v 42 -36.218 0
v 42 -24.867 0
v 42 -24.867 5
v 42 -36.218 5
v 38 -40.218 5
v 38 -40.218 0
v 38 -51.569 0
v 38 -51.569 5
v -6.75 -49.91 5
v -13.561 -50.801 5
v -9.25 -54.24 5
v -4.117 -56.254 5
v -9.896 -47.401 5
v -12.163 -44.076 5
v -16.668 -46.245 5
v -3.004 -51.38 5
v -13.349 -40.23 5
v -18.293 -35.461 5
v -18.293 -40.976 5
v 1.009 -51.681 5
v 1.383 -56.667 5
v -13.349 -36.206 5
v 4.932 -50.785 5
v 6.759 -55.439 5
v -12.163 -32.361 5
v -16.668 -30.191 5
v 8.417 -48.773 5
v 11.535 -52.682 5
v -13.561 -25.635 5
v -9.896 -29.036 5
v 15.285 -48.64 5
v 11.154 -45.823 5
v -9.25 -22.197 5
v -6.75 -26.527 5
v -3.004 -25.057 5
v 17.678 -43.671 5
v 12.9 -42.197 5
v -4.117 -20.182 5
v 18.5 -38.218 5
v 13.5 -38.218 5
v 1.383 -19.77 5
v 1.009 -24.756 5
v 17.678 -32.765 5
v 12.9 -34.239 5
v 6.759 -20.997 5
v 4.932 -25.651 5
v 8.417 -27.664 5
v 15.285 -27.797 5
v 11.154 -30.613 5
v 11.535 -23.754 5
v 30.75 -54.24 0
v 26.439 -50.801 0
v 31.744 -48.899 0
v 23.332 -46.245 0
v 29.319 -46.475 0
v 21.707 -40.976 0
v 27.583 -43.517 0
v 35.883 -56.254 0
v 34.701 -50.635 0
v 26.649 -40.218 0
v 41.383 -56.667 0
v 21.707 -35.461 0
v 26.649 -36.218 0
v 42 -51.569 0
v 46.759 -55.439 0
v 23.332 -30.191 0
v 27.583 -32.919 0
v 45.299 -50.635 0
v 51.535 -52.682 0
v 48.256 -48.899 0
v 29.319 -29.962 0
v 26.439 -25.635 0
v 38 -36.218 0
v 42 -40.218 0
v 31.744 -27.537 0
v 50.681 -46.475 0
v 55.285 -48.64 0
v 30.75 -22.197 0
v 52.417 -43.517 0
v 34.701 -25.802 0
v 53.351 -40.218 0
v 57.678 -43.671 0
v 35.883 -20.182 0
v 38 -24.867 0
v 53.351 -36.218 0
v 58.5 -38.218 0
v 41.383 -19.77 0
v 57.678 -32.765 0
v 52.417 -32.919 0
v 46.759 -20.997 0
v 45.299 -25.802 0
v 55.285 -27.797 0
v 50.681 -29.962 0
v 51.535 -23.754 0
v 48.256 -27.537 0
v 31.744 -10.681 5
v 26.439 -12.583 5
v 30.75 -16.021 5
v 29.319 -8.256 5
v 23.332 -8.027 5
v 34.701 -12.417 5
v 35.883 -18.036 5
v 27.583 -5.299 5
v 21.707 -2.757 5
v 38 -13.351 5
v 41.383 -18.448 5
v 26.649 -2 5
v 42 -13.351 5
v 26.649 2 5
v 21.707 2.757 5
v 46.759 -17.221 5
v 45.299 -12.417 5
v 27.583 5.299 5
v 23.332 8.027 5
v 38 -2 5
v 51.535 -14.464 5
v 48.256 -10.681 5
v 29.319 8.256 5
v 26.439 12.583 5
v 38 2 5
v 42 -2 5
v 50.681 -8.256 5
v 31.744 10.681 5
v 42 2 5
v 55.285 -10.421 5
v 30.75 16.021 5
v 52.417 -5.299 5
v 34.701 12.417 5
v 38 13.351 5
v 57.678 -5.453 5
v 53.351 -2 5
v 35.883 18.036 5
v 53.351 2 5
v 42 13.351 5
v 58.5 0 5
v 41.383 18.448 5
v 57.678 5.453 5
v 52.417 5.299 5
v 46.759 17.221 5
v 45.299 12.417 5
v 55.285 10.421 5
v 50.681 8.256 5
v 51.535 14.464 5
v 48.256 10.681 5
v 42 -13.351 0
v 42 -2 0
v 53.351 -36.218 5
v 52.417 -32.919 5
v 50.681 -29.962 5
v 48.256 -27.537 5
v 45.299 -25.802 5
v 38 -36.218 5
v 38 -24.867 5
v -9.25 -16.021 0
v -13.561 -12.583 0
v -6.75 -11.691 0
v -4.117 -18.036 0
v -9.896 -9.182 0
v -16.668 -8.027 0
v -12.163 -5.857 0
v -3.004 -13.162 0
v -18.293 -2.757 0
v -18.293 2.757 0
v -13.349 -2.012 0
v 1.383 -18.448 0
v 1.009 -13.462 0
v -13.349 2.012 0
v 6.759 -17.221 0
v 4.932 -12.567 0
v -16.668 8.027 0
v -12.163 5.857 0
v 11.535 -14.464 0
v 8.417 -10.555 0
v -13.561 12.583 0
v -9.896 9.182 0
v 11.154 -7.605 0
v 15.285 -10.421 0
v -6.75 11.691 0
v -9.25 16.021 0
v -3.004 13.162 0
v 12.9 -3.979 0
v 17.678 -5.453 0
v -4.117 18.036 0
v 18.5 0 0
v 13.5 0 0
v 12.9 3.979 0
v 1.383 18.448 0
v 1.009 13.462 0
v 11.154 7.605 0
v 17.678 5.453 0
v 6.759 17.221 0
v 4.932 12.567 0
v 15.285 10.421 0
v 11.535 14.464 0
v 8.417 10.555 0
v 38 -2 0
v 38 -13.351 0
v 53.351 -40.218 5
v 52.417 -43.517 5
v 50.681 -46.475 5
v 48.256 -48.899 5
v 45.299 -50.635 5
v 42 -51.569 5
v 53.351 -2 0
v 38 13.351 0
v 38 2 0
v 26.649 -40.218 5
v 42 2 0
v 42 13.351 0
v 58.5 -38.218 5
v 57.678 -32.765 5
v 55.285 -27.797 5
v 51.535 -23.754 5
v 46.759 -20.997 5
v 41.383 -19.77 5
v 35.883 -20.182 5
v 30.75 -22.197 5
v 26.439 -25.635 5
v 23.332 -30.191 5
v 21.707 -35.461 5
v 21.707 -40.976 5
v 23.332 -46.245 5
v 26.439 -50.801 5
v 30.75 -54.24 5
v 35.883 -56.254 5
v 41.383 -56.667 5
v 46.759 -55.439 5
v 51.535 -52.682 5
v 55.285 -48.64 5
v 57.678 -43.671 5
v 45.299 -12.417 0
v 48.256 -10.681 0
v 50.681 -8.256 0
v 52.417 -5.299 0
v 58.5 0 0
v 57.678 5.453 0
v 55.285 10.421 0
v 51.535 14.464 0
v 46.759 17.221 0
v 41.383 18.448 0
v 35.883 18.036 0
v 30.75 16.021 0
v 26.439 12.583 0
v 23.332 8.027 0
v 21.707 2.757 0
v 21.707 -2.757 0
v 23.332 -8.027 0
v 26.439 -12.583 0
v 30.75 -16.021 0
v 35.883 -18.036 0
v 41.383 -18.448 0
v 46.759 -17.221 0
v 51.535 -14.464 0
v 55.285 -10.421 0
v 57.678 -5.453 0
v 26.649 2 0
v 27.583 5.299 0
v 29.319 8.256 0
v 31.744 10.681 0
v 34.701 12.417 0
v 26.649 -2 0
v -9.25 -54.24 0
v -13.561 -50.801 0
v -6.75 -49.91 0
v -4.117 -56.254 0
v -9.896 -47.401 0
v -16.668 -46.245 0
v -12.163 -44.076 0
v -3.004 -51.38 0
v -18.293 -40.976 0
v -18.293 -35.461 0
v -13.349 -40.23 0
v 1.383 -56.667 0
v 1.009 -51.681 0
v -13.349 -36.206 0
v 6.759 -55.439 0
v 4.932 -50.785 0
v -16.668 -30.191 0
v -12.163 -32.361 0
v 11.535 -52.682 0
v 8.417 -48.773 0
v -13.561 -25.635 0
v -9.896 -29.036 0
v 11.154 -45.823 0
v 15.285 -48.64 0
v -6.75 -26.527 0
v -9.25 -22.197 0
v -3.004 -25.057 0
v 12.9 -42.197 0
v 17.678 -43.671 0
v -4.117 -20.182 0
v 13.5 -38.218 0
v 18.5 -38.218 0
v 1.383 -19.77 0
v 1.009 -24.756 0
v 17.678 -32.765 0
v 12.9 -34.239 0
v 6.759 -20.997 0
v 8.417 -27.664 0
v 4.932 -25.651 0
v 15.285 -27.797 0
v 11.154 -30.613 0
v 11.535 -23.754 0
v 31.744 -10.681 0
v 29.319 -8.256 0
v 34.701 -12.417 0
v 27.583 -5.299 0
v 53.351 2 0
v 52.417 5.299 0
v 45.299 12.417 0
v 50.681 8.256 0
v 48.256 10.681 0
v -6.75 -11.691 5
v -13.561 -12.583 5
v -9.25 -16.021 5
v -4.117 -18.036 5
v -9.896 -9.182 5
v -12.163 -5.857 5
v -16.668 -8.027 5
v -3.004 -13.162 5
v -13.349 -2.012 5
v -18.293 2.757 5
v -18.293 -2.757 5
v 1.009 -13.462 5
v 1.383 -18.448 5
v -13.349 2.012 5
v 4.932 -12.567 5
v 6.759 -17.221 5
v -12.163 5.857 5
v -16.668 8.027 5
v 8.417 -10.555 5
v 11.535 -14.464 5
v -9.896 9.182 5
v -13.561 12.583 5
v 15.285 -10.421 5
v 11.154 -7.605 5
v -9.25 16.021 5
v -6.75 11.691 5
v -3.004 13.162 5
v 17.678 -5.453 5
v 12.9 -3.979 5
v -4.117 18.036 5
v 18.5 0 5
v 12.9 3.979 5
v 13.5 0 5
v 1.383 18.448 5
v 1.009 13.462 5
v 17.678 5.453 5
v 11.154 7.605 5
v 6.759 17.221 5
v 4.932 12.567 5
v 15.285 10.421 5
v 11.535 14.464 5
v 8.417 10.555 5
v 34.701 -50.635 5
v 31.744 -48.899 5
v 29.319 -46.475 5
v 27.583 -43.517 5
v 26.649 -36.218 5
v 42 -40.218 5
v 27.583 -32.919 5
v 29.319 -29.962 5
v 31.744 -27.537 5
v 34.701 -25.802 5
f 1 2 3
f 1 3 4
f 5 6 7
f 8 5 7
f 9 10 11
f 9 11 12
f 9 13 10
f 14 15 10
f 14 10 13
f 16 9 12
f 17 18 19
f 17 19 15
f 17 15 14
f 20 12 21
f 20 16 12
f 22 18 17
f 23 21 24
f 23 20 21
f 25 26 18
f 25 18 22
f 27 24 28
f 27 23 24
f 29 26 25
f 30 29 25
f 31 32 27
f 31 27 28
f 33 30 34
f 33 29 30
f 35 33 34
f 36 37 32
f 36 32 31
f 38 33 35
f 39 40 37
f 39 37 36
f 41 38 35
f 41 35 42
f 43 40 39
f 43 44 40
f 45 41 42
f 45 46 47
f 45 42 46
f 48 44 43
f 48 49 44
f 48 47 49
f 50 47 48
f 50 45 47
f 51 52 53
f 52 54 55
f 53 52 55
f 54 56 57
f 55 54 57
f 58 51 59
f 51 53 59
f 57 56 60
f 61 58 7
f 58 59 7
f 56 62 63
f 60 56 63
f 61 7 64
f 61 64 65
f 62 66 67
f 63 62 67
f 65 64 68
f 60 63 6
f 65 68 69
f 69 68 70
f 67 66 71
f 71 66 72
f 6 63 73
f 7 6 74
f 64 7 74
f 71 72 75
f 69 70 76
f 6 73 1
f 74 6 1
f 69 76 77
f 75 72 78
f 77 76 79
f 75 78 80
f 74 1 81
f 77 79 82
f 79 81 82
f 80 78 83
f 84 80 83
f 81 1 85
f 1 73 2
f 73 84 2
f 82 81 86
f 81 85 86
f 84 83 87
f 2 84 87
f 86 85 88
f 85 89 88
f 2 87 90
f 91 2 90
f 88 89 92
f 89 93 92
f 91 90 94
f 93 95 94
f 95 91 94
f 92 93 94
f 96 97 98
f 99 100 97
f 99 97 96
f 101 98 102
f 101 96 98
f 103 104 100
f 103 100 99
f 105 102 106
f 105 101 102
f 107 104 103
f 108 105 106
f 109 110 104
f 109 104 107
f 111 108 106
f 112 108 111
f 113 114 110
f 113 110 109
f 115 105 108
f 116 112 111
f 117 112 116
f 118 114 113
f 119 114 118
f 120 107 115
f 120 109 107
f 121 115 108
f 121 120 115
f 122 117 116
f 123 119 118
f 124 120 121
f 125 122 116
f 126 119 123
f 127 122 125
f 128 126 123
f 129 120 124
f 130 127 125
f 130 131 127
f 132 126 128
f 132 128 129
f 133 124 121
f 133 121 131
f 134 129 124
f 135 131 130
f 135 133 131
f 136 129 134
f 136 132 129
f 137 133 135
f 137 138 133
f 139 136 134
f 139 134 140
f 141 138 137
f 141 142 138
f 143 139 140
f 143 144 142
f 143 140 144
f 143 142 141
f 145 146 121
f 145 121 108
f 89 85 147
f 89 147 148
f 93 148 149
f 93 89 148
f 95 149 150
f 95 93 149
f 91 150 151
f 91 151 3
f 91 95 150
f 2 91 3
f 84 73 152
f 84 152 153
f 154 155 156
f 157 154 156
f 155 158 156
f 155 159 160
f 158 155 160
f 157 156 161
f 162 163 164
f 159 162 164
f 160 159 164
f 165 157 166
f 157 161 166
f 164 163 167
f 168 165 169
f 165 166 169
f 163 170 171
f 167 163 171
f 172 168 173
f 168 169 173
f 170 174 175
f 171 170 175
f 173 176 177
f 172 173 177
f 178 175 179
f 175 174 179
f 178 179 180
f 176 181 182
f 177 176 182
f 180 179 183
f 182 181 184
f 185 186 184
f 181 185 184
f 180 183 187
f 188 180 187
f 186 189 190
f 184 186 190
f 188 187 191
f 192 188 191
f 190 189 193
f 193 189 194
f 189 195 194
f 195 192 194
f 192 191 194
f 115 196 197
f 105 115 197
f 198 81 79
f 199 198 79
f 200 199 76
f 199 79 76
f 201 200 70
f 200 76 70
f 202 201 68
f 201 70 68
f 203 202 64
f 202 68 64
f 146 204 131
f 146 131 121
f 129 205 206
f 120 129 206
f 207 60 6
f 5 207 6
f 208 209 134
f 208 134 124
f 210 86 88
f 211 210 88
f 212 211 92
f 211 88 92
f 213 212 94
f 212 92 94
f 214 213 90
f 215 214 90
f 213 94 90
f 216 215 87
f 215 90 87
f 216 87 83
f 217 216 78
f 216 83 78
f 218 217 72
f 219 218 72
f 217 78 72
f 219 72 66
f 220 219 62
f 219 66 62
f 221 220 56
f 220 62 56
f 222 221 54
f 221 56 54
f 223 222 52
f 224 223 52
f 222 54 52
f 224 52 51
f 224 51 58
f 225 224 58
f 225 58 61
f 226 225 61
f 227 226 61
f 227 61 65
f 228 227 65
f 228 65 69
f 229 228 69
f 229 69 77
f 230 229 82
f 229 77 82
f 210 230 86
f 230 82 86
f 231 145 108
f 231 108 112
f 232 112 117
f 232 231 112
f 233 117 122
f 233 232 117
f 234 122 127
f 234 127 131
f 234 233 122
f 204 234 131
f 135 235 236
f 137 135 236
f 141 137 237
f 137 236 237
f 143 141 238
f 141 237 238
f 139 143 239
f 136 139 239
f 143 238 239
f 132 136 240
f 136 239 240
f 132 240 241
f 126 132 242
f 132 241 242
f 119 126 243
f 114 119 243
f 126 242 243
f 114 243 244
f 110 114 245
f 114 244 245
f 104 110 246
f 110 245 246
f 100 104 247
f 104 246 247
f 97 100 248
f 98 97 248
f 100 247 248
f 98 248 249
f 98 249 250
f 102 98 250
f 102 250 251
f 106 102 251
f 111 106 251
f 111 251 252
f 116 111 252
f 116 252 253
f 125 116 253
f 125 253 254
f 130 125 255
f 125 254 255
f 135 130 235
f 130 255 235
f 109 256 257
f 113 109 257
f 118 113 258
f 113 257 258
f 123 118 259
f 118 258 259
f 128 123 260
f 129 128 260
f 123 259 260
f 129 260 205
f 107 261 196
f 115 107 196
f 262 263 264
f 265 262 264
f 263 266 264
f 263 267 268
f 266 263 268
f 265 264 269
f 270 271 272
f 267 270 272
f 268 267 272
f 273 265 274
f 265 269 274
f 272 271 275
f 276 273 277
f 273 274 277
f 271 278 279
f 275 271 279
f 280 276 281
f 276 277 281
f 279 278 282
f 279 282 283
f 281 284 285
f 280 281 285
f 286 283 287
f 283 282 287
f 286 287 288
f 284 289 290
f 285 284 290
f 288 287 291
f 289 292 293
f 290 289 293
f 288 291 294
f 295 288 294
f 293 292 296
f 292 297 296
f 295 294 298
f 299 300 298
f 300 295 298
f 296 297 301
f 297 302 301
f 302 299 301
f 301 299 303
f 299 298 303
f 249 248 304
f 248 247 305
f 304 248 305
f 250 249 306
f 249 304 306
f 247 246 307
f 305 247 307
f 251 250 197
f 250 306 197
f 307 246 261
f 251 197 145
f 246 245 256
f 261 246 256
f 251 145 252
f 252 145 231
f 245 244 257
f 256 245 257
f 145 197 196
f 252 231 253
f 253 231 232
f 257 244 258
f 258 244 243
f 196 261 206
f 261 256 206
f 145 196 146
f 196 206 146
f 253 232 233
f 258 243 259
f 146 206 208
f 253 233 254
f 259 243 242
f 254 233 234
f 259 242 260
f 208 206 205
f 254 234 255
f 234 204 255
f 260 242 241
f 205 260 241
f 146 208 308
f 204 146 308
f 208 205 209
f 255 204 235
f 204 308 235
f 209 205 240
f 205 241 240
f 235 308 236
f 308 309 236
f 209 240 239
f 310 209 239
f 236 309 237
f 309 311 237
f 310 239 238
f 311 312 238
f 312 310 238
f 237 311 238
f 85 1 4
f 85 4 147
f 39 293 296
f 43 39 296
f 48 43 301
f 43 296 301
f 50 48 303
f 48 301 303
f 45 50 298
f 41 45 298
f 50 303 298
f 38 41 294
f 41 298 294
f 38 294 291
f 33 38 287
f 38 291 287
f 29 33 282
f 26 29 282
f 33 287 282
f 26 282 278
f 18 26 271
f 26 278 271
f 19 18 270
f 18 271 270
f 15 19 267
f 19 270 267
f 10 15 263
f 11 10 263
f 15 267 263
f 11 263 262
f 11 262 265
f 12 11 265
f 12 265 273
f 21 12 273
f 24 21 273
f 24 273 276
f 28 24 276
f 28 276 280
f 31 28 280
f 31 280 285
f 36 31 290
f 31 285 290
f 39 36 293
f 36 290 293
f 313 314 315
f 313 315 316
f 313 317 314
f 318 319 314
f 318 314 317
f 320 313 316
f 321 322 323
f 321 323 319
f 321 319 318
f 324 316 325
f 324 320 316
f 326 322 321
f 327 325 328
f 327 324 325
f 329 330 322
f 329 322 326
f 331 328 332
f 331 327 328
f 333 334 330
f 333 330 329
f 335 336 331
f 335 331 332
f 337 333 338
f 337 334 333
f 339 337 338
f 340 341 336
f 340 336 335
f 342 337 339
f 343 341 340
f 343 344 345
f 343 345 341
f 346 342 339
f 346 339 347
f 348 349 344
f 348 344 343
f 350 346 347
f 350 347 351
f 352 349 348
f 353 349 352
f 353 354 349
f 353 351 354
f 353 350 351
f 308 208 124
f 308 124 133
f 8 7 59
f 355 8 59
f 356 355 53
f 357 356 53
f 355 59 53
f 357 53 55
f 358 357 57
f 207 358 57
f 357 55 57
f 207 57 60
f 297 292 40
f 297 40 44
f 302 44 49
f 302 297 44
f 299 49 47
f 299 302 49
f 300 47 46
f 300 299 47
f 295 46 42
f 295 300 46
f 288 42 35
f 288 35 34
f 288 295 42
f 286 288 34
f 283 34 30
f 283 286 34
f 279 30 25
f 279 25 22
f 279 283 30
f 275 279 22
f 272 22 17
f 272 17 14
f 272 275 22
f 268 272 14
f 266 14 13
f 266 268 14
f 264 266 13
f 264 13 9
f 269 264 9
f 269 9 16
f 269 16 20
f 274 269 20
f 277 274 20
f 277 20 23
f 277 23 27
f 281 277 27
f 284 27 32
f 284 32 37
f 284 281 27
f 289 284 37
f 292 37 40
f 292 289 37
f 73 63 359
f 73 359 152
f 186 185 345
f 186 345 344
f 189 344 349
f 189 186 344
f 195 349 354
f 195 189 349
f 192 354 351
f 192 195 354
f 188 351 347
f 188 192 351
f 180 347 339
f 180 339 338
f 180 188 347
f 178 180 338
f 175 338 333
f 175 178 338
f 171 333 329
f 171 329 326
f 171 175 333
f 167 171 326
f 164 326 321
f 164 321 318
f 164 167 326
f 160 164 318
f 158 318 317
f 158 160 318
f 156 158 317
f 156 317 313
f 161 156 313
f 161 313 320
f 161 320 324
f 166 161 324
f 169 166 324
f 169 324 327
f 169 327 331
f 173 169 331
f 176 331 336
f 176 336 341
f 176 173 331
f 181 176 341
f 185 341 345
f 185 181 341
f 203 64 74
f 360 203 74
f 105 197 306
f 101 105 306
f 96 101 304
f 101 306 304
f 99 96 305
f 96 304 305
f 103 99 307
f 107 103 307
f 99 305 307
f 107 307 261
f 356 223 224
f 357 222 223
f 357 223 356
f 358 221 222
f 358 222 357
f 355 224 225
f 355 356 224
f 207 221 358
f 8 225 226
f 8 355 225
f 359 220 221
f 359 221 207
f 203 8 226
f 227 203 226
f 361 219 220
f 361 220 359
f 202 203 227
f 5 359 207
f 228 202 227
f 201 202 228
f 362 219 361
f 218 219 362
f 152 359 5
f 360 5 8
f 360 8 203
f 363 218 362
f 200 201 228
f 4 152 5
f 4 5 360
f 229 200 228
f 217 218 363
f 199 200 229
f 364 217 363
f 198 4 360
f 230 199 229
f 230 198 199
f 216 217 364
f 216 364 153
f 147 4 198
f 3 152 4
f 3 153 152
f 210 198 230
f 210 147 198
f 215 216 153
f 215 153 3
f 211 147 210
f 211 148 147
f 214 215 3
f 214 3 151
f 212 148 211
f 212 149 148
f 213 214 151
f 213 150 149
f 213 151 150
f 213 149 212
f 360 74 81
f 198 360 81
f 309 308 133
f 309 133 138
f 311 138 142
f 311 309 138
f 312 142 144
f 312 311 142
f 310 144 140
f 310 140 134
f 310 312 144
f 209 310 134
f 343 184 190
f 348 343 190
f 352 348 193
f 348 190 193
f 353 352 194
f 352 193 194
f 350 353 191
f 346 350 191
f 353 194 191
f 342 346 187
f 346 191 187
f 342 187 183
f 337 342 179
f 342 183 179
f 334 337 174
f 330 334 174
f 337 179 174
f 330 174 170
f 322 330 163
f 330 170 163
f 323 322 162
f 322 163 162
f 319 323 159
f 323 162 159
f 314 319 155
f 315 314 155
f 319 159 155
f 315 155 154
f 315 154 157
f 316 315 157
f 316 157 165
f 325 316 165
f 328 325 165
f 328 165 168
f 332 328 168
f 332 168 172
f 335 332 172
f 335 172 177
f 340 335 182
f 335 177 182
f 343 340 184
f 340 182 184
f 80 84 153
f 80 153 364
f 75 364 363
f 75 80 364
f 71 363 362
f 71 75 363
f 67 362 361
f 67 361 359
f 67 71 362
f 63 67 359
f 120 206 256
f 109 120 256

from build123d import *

# Parameters (mm, degrees)
SKETCH1_R             = 18.5
SKETCH1_R_2           = 13.5
BOSS_EXTRUDE1_DEPTH   = 5
BOSS_EXTRUDE1_2_DEPTH = 5
BOSS_EXTRUDE1_3_DEPTH = 5
BOSS_EXTRUDE1_4_DEPTH = 5


with BuildPart() as part:
    # Sketch1 → Boss-Extrude1 (new body)
    with BuildSketch(Plane.XY):
        Circle(SKETCH1_R)
        Circle(SKETCH1_R_2, mode=Mode.SUBTRACT)
    extrude(amount=BOSS_EXTRUDE1_DEPTH)


with BuildPart() as body_2:
    # Sketch1 → Boss-Extrude1 2 (new body)
    with BuildSketch(Plane.XY):
        with Locations((40, 0)):
            Circle(SKETCH1_R)
        with BuildLine():
            Line((38, 13.351029923), (38, 2))
            Line((38, 2), (26.648970077, 2))
            ThreePointArc((26.648970077, 2), (30.454058454, 9.545941546), (38, 13.351029923))
        make_face(mode=Mode.SUBTRACT)
        with BuildLine():
            Line((26.648970077, -2), (38, -2))
            Line((38, -2), (38, -13.351029923))
            ThreePointArc((38, -13.351029923), (30.454058454, -9.545941546), (26.648970077, -2))
        make_face(mode=Mode.SUBTRACT)
        with BuildLine():
            Line((42, 13.351029923), (42, 2))
            Line((42, 2), (53.351029923, 2))
            ThreePointArc((53.351029923, 2), (49.545941546, 9.545941546), (42, 13.351029923))
        make_face(mode=Mode.SUBTRACT)
        with BuildLine():
            Line((42, -2), (42, -13.351029923))
            ThreePointArc((42, -13.351029923), (49.545941546, -9.545941546), (53.351029923, -2))
            Line((53.351029923, -2), (42, -2))
        make_face(mode=Mode.SUBTRACT)
    extrude(amount=BOSS_EXTRUDE1_2_DEPTH)


with BuildPart() as body_3:
    # Sketch1 → Boss-Extrude1 3 (new body)
    with BuildSketch(Plane.XY):
        with Locations((0, -38.218276901)):
            Circle(SKETCH1_R)
        with Locations((0, -38.218276901)):
            Circle(SKETCH1_R_2, mode=Mode.SUBTRACT)
    extrude(amount=BOSS_EXTRUDE1_3_DEPTH)


with BuildPart() as body_4:
    # Sketch1 → Boss-Extrude1 4 (new body)
    with BuildSketch(Plane.XY):
        with Locations((40, -38.218276901)):
            Circle(SKETCH1_R)
        with BuildLine():
            Line((26.648970077, -36.218276901), (38, -36.218276901))
            Line((38, -36.218276901), (38, -24.867246978))
            ThreePointArc((38, -24.867246978), (30.454058454, -28.672335355), (26.648970077, -36.218276901))
        make_face(mode=Mode.SUBTRACT)
        with BuildLine():
            Line((38, -40.218276901), (38, -51.569306824))
            ThreePointArc((38, -51.569306824), (30.454058454, -47.764218447), (26.648970077, -40.218276901))
            Line((26.648970077, -40.218276901), (38, -40.218276901))
        make_face(mode=Mode.SUBTRACT)
        with BuildLine():
            Line((42, -40.218276901), (53.351029923, -40.218276901))
            ThreePointArc((53.351029923, -40.218276901), (49.545941546, -47.764218447), (42, -51.569306824))
            Line((42, -51.569306824), (42, -40.218276901))
        make_face(mode=Mode.SUBTRACT)
        with BuildLine():
            Line((42, -36.218276901), (53.351029923, -36.218276901))
            ThreePointArc((53.351029923, -36.218276901), (49.545941546, -28.672335355), (42, -24.867246978))
            Line((42, -24.867246978), (42, -36.218276901))
        make_face(mode=Mode.SUBTRACT)
    extrude(amount=BOSS_EXTRUDE1_4_DEPTH)


solid = Compound([part.part, body_2.part, body_3.part, body_4.part])
